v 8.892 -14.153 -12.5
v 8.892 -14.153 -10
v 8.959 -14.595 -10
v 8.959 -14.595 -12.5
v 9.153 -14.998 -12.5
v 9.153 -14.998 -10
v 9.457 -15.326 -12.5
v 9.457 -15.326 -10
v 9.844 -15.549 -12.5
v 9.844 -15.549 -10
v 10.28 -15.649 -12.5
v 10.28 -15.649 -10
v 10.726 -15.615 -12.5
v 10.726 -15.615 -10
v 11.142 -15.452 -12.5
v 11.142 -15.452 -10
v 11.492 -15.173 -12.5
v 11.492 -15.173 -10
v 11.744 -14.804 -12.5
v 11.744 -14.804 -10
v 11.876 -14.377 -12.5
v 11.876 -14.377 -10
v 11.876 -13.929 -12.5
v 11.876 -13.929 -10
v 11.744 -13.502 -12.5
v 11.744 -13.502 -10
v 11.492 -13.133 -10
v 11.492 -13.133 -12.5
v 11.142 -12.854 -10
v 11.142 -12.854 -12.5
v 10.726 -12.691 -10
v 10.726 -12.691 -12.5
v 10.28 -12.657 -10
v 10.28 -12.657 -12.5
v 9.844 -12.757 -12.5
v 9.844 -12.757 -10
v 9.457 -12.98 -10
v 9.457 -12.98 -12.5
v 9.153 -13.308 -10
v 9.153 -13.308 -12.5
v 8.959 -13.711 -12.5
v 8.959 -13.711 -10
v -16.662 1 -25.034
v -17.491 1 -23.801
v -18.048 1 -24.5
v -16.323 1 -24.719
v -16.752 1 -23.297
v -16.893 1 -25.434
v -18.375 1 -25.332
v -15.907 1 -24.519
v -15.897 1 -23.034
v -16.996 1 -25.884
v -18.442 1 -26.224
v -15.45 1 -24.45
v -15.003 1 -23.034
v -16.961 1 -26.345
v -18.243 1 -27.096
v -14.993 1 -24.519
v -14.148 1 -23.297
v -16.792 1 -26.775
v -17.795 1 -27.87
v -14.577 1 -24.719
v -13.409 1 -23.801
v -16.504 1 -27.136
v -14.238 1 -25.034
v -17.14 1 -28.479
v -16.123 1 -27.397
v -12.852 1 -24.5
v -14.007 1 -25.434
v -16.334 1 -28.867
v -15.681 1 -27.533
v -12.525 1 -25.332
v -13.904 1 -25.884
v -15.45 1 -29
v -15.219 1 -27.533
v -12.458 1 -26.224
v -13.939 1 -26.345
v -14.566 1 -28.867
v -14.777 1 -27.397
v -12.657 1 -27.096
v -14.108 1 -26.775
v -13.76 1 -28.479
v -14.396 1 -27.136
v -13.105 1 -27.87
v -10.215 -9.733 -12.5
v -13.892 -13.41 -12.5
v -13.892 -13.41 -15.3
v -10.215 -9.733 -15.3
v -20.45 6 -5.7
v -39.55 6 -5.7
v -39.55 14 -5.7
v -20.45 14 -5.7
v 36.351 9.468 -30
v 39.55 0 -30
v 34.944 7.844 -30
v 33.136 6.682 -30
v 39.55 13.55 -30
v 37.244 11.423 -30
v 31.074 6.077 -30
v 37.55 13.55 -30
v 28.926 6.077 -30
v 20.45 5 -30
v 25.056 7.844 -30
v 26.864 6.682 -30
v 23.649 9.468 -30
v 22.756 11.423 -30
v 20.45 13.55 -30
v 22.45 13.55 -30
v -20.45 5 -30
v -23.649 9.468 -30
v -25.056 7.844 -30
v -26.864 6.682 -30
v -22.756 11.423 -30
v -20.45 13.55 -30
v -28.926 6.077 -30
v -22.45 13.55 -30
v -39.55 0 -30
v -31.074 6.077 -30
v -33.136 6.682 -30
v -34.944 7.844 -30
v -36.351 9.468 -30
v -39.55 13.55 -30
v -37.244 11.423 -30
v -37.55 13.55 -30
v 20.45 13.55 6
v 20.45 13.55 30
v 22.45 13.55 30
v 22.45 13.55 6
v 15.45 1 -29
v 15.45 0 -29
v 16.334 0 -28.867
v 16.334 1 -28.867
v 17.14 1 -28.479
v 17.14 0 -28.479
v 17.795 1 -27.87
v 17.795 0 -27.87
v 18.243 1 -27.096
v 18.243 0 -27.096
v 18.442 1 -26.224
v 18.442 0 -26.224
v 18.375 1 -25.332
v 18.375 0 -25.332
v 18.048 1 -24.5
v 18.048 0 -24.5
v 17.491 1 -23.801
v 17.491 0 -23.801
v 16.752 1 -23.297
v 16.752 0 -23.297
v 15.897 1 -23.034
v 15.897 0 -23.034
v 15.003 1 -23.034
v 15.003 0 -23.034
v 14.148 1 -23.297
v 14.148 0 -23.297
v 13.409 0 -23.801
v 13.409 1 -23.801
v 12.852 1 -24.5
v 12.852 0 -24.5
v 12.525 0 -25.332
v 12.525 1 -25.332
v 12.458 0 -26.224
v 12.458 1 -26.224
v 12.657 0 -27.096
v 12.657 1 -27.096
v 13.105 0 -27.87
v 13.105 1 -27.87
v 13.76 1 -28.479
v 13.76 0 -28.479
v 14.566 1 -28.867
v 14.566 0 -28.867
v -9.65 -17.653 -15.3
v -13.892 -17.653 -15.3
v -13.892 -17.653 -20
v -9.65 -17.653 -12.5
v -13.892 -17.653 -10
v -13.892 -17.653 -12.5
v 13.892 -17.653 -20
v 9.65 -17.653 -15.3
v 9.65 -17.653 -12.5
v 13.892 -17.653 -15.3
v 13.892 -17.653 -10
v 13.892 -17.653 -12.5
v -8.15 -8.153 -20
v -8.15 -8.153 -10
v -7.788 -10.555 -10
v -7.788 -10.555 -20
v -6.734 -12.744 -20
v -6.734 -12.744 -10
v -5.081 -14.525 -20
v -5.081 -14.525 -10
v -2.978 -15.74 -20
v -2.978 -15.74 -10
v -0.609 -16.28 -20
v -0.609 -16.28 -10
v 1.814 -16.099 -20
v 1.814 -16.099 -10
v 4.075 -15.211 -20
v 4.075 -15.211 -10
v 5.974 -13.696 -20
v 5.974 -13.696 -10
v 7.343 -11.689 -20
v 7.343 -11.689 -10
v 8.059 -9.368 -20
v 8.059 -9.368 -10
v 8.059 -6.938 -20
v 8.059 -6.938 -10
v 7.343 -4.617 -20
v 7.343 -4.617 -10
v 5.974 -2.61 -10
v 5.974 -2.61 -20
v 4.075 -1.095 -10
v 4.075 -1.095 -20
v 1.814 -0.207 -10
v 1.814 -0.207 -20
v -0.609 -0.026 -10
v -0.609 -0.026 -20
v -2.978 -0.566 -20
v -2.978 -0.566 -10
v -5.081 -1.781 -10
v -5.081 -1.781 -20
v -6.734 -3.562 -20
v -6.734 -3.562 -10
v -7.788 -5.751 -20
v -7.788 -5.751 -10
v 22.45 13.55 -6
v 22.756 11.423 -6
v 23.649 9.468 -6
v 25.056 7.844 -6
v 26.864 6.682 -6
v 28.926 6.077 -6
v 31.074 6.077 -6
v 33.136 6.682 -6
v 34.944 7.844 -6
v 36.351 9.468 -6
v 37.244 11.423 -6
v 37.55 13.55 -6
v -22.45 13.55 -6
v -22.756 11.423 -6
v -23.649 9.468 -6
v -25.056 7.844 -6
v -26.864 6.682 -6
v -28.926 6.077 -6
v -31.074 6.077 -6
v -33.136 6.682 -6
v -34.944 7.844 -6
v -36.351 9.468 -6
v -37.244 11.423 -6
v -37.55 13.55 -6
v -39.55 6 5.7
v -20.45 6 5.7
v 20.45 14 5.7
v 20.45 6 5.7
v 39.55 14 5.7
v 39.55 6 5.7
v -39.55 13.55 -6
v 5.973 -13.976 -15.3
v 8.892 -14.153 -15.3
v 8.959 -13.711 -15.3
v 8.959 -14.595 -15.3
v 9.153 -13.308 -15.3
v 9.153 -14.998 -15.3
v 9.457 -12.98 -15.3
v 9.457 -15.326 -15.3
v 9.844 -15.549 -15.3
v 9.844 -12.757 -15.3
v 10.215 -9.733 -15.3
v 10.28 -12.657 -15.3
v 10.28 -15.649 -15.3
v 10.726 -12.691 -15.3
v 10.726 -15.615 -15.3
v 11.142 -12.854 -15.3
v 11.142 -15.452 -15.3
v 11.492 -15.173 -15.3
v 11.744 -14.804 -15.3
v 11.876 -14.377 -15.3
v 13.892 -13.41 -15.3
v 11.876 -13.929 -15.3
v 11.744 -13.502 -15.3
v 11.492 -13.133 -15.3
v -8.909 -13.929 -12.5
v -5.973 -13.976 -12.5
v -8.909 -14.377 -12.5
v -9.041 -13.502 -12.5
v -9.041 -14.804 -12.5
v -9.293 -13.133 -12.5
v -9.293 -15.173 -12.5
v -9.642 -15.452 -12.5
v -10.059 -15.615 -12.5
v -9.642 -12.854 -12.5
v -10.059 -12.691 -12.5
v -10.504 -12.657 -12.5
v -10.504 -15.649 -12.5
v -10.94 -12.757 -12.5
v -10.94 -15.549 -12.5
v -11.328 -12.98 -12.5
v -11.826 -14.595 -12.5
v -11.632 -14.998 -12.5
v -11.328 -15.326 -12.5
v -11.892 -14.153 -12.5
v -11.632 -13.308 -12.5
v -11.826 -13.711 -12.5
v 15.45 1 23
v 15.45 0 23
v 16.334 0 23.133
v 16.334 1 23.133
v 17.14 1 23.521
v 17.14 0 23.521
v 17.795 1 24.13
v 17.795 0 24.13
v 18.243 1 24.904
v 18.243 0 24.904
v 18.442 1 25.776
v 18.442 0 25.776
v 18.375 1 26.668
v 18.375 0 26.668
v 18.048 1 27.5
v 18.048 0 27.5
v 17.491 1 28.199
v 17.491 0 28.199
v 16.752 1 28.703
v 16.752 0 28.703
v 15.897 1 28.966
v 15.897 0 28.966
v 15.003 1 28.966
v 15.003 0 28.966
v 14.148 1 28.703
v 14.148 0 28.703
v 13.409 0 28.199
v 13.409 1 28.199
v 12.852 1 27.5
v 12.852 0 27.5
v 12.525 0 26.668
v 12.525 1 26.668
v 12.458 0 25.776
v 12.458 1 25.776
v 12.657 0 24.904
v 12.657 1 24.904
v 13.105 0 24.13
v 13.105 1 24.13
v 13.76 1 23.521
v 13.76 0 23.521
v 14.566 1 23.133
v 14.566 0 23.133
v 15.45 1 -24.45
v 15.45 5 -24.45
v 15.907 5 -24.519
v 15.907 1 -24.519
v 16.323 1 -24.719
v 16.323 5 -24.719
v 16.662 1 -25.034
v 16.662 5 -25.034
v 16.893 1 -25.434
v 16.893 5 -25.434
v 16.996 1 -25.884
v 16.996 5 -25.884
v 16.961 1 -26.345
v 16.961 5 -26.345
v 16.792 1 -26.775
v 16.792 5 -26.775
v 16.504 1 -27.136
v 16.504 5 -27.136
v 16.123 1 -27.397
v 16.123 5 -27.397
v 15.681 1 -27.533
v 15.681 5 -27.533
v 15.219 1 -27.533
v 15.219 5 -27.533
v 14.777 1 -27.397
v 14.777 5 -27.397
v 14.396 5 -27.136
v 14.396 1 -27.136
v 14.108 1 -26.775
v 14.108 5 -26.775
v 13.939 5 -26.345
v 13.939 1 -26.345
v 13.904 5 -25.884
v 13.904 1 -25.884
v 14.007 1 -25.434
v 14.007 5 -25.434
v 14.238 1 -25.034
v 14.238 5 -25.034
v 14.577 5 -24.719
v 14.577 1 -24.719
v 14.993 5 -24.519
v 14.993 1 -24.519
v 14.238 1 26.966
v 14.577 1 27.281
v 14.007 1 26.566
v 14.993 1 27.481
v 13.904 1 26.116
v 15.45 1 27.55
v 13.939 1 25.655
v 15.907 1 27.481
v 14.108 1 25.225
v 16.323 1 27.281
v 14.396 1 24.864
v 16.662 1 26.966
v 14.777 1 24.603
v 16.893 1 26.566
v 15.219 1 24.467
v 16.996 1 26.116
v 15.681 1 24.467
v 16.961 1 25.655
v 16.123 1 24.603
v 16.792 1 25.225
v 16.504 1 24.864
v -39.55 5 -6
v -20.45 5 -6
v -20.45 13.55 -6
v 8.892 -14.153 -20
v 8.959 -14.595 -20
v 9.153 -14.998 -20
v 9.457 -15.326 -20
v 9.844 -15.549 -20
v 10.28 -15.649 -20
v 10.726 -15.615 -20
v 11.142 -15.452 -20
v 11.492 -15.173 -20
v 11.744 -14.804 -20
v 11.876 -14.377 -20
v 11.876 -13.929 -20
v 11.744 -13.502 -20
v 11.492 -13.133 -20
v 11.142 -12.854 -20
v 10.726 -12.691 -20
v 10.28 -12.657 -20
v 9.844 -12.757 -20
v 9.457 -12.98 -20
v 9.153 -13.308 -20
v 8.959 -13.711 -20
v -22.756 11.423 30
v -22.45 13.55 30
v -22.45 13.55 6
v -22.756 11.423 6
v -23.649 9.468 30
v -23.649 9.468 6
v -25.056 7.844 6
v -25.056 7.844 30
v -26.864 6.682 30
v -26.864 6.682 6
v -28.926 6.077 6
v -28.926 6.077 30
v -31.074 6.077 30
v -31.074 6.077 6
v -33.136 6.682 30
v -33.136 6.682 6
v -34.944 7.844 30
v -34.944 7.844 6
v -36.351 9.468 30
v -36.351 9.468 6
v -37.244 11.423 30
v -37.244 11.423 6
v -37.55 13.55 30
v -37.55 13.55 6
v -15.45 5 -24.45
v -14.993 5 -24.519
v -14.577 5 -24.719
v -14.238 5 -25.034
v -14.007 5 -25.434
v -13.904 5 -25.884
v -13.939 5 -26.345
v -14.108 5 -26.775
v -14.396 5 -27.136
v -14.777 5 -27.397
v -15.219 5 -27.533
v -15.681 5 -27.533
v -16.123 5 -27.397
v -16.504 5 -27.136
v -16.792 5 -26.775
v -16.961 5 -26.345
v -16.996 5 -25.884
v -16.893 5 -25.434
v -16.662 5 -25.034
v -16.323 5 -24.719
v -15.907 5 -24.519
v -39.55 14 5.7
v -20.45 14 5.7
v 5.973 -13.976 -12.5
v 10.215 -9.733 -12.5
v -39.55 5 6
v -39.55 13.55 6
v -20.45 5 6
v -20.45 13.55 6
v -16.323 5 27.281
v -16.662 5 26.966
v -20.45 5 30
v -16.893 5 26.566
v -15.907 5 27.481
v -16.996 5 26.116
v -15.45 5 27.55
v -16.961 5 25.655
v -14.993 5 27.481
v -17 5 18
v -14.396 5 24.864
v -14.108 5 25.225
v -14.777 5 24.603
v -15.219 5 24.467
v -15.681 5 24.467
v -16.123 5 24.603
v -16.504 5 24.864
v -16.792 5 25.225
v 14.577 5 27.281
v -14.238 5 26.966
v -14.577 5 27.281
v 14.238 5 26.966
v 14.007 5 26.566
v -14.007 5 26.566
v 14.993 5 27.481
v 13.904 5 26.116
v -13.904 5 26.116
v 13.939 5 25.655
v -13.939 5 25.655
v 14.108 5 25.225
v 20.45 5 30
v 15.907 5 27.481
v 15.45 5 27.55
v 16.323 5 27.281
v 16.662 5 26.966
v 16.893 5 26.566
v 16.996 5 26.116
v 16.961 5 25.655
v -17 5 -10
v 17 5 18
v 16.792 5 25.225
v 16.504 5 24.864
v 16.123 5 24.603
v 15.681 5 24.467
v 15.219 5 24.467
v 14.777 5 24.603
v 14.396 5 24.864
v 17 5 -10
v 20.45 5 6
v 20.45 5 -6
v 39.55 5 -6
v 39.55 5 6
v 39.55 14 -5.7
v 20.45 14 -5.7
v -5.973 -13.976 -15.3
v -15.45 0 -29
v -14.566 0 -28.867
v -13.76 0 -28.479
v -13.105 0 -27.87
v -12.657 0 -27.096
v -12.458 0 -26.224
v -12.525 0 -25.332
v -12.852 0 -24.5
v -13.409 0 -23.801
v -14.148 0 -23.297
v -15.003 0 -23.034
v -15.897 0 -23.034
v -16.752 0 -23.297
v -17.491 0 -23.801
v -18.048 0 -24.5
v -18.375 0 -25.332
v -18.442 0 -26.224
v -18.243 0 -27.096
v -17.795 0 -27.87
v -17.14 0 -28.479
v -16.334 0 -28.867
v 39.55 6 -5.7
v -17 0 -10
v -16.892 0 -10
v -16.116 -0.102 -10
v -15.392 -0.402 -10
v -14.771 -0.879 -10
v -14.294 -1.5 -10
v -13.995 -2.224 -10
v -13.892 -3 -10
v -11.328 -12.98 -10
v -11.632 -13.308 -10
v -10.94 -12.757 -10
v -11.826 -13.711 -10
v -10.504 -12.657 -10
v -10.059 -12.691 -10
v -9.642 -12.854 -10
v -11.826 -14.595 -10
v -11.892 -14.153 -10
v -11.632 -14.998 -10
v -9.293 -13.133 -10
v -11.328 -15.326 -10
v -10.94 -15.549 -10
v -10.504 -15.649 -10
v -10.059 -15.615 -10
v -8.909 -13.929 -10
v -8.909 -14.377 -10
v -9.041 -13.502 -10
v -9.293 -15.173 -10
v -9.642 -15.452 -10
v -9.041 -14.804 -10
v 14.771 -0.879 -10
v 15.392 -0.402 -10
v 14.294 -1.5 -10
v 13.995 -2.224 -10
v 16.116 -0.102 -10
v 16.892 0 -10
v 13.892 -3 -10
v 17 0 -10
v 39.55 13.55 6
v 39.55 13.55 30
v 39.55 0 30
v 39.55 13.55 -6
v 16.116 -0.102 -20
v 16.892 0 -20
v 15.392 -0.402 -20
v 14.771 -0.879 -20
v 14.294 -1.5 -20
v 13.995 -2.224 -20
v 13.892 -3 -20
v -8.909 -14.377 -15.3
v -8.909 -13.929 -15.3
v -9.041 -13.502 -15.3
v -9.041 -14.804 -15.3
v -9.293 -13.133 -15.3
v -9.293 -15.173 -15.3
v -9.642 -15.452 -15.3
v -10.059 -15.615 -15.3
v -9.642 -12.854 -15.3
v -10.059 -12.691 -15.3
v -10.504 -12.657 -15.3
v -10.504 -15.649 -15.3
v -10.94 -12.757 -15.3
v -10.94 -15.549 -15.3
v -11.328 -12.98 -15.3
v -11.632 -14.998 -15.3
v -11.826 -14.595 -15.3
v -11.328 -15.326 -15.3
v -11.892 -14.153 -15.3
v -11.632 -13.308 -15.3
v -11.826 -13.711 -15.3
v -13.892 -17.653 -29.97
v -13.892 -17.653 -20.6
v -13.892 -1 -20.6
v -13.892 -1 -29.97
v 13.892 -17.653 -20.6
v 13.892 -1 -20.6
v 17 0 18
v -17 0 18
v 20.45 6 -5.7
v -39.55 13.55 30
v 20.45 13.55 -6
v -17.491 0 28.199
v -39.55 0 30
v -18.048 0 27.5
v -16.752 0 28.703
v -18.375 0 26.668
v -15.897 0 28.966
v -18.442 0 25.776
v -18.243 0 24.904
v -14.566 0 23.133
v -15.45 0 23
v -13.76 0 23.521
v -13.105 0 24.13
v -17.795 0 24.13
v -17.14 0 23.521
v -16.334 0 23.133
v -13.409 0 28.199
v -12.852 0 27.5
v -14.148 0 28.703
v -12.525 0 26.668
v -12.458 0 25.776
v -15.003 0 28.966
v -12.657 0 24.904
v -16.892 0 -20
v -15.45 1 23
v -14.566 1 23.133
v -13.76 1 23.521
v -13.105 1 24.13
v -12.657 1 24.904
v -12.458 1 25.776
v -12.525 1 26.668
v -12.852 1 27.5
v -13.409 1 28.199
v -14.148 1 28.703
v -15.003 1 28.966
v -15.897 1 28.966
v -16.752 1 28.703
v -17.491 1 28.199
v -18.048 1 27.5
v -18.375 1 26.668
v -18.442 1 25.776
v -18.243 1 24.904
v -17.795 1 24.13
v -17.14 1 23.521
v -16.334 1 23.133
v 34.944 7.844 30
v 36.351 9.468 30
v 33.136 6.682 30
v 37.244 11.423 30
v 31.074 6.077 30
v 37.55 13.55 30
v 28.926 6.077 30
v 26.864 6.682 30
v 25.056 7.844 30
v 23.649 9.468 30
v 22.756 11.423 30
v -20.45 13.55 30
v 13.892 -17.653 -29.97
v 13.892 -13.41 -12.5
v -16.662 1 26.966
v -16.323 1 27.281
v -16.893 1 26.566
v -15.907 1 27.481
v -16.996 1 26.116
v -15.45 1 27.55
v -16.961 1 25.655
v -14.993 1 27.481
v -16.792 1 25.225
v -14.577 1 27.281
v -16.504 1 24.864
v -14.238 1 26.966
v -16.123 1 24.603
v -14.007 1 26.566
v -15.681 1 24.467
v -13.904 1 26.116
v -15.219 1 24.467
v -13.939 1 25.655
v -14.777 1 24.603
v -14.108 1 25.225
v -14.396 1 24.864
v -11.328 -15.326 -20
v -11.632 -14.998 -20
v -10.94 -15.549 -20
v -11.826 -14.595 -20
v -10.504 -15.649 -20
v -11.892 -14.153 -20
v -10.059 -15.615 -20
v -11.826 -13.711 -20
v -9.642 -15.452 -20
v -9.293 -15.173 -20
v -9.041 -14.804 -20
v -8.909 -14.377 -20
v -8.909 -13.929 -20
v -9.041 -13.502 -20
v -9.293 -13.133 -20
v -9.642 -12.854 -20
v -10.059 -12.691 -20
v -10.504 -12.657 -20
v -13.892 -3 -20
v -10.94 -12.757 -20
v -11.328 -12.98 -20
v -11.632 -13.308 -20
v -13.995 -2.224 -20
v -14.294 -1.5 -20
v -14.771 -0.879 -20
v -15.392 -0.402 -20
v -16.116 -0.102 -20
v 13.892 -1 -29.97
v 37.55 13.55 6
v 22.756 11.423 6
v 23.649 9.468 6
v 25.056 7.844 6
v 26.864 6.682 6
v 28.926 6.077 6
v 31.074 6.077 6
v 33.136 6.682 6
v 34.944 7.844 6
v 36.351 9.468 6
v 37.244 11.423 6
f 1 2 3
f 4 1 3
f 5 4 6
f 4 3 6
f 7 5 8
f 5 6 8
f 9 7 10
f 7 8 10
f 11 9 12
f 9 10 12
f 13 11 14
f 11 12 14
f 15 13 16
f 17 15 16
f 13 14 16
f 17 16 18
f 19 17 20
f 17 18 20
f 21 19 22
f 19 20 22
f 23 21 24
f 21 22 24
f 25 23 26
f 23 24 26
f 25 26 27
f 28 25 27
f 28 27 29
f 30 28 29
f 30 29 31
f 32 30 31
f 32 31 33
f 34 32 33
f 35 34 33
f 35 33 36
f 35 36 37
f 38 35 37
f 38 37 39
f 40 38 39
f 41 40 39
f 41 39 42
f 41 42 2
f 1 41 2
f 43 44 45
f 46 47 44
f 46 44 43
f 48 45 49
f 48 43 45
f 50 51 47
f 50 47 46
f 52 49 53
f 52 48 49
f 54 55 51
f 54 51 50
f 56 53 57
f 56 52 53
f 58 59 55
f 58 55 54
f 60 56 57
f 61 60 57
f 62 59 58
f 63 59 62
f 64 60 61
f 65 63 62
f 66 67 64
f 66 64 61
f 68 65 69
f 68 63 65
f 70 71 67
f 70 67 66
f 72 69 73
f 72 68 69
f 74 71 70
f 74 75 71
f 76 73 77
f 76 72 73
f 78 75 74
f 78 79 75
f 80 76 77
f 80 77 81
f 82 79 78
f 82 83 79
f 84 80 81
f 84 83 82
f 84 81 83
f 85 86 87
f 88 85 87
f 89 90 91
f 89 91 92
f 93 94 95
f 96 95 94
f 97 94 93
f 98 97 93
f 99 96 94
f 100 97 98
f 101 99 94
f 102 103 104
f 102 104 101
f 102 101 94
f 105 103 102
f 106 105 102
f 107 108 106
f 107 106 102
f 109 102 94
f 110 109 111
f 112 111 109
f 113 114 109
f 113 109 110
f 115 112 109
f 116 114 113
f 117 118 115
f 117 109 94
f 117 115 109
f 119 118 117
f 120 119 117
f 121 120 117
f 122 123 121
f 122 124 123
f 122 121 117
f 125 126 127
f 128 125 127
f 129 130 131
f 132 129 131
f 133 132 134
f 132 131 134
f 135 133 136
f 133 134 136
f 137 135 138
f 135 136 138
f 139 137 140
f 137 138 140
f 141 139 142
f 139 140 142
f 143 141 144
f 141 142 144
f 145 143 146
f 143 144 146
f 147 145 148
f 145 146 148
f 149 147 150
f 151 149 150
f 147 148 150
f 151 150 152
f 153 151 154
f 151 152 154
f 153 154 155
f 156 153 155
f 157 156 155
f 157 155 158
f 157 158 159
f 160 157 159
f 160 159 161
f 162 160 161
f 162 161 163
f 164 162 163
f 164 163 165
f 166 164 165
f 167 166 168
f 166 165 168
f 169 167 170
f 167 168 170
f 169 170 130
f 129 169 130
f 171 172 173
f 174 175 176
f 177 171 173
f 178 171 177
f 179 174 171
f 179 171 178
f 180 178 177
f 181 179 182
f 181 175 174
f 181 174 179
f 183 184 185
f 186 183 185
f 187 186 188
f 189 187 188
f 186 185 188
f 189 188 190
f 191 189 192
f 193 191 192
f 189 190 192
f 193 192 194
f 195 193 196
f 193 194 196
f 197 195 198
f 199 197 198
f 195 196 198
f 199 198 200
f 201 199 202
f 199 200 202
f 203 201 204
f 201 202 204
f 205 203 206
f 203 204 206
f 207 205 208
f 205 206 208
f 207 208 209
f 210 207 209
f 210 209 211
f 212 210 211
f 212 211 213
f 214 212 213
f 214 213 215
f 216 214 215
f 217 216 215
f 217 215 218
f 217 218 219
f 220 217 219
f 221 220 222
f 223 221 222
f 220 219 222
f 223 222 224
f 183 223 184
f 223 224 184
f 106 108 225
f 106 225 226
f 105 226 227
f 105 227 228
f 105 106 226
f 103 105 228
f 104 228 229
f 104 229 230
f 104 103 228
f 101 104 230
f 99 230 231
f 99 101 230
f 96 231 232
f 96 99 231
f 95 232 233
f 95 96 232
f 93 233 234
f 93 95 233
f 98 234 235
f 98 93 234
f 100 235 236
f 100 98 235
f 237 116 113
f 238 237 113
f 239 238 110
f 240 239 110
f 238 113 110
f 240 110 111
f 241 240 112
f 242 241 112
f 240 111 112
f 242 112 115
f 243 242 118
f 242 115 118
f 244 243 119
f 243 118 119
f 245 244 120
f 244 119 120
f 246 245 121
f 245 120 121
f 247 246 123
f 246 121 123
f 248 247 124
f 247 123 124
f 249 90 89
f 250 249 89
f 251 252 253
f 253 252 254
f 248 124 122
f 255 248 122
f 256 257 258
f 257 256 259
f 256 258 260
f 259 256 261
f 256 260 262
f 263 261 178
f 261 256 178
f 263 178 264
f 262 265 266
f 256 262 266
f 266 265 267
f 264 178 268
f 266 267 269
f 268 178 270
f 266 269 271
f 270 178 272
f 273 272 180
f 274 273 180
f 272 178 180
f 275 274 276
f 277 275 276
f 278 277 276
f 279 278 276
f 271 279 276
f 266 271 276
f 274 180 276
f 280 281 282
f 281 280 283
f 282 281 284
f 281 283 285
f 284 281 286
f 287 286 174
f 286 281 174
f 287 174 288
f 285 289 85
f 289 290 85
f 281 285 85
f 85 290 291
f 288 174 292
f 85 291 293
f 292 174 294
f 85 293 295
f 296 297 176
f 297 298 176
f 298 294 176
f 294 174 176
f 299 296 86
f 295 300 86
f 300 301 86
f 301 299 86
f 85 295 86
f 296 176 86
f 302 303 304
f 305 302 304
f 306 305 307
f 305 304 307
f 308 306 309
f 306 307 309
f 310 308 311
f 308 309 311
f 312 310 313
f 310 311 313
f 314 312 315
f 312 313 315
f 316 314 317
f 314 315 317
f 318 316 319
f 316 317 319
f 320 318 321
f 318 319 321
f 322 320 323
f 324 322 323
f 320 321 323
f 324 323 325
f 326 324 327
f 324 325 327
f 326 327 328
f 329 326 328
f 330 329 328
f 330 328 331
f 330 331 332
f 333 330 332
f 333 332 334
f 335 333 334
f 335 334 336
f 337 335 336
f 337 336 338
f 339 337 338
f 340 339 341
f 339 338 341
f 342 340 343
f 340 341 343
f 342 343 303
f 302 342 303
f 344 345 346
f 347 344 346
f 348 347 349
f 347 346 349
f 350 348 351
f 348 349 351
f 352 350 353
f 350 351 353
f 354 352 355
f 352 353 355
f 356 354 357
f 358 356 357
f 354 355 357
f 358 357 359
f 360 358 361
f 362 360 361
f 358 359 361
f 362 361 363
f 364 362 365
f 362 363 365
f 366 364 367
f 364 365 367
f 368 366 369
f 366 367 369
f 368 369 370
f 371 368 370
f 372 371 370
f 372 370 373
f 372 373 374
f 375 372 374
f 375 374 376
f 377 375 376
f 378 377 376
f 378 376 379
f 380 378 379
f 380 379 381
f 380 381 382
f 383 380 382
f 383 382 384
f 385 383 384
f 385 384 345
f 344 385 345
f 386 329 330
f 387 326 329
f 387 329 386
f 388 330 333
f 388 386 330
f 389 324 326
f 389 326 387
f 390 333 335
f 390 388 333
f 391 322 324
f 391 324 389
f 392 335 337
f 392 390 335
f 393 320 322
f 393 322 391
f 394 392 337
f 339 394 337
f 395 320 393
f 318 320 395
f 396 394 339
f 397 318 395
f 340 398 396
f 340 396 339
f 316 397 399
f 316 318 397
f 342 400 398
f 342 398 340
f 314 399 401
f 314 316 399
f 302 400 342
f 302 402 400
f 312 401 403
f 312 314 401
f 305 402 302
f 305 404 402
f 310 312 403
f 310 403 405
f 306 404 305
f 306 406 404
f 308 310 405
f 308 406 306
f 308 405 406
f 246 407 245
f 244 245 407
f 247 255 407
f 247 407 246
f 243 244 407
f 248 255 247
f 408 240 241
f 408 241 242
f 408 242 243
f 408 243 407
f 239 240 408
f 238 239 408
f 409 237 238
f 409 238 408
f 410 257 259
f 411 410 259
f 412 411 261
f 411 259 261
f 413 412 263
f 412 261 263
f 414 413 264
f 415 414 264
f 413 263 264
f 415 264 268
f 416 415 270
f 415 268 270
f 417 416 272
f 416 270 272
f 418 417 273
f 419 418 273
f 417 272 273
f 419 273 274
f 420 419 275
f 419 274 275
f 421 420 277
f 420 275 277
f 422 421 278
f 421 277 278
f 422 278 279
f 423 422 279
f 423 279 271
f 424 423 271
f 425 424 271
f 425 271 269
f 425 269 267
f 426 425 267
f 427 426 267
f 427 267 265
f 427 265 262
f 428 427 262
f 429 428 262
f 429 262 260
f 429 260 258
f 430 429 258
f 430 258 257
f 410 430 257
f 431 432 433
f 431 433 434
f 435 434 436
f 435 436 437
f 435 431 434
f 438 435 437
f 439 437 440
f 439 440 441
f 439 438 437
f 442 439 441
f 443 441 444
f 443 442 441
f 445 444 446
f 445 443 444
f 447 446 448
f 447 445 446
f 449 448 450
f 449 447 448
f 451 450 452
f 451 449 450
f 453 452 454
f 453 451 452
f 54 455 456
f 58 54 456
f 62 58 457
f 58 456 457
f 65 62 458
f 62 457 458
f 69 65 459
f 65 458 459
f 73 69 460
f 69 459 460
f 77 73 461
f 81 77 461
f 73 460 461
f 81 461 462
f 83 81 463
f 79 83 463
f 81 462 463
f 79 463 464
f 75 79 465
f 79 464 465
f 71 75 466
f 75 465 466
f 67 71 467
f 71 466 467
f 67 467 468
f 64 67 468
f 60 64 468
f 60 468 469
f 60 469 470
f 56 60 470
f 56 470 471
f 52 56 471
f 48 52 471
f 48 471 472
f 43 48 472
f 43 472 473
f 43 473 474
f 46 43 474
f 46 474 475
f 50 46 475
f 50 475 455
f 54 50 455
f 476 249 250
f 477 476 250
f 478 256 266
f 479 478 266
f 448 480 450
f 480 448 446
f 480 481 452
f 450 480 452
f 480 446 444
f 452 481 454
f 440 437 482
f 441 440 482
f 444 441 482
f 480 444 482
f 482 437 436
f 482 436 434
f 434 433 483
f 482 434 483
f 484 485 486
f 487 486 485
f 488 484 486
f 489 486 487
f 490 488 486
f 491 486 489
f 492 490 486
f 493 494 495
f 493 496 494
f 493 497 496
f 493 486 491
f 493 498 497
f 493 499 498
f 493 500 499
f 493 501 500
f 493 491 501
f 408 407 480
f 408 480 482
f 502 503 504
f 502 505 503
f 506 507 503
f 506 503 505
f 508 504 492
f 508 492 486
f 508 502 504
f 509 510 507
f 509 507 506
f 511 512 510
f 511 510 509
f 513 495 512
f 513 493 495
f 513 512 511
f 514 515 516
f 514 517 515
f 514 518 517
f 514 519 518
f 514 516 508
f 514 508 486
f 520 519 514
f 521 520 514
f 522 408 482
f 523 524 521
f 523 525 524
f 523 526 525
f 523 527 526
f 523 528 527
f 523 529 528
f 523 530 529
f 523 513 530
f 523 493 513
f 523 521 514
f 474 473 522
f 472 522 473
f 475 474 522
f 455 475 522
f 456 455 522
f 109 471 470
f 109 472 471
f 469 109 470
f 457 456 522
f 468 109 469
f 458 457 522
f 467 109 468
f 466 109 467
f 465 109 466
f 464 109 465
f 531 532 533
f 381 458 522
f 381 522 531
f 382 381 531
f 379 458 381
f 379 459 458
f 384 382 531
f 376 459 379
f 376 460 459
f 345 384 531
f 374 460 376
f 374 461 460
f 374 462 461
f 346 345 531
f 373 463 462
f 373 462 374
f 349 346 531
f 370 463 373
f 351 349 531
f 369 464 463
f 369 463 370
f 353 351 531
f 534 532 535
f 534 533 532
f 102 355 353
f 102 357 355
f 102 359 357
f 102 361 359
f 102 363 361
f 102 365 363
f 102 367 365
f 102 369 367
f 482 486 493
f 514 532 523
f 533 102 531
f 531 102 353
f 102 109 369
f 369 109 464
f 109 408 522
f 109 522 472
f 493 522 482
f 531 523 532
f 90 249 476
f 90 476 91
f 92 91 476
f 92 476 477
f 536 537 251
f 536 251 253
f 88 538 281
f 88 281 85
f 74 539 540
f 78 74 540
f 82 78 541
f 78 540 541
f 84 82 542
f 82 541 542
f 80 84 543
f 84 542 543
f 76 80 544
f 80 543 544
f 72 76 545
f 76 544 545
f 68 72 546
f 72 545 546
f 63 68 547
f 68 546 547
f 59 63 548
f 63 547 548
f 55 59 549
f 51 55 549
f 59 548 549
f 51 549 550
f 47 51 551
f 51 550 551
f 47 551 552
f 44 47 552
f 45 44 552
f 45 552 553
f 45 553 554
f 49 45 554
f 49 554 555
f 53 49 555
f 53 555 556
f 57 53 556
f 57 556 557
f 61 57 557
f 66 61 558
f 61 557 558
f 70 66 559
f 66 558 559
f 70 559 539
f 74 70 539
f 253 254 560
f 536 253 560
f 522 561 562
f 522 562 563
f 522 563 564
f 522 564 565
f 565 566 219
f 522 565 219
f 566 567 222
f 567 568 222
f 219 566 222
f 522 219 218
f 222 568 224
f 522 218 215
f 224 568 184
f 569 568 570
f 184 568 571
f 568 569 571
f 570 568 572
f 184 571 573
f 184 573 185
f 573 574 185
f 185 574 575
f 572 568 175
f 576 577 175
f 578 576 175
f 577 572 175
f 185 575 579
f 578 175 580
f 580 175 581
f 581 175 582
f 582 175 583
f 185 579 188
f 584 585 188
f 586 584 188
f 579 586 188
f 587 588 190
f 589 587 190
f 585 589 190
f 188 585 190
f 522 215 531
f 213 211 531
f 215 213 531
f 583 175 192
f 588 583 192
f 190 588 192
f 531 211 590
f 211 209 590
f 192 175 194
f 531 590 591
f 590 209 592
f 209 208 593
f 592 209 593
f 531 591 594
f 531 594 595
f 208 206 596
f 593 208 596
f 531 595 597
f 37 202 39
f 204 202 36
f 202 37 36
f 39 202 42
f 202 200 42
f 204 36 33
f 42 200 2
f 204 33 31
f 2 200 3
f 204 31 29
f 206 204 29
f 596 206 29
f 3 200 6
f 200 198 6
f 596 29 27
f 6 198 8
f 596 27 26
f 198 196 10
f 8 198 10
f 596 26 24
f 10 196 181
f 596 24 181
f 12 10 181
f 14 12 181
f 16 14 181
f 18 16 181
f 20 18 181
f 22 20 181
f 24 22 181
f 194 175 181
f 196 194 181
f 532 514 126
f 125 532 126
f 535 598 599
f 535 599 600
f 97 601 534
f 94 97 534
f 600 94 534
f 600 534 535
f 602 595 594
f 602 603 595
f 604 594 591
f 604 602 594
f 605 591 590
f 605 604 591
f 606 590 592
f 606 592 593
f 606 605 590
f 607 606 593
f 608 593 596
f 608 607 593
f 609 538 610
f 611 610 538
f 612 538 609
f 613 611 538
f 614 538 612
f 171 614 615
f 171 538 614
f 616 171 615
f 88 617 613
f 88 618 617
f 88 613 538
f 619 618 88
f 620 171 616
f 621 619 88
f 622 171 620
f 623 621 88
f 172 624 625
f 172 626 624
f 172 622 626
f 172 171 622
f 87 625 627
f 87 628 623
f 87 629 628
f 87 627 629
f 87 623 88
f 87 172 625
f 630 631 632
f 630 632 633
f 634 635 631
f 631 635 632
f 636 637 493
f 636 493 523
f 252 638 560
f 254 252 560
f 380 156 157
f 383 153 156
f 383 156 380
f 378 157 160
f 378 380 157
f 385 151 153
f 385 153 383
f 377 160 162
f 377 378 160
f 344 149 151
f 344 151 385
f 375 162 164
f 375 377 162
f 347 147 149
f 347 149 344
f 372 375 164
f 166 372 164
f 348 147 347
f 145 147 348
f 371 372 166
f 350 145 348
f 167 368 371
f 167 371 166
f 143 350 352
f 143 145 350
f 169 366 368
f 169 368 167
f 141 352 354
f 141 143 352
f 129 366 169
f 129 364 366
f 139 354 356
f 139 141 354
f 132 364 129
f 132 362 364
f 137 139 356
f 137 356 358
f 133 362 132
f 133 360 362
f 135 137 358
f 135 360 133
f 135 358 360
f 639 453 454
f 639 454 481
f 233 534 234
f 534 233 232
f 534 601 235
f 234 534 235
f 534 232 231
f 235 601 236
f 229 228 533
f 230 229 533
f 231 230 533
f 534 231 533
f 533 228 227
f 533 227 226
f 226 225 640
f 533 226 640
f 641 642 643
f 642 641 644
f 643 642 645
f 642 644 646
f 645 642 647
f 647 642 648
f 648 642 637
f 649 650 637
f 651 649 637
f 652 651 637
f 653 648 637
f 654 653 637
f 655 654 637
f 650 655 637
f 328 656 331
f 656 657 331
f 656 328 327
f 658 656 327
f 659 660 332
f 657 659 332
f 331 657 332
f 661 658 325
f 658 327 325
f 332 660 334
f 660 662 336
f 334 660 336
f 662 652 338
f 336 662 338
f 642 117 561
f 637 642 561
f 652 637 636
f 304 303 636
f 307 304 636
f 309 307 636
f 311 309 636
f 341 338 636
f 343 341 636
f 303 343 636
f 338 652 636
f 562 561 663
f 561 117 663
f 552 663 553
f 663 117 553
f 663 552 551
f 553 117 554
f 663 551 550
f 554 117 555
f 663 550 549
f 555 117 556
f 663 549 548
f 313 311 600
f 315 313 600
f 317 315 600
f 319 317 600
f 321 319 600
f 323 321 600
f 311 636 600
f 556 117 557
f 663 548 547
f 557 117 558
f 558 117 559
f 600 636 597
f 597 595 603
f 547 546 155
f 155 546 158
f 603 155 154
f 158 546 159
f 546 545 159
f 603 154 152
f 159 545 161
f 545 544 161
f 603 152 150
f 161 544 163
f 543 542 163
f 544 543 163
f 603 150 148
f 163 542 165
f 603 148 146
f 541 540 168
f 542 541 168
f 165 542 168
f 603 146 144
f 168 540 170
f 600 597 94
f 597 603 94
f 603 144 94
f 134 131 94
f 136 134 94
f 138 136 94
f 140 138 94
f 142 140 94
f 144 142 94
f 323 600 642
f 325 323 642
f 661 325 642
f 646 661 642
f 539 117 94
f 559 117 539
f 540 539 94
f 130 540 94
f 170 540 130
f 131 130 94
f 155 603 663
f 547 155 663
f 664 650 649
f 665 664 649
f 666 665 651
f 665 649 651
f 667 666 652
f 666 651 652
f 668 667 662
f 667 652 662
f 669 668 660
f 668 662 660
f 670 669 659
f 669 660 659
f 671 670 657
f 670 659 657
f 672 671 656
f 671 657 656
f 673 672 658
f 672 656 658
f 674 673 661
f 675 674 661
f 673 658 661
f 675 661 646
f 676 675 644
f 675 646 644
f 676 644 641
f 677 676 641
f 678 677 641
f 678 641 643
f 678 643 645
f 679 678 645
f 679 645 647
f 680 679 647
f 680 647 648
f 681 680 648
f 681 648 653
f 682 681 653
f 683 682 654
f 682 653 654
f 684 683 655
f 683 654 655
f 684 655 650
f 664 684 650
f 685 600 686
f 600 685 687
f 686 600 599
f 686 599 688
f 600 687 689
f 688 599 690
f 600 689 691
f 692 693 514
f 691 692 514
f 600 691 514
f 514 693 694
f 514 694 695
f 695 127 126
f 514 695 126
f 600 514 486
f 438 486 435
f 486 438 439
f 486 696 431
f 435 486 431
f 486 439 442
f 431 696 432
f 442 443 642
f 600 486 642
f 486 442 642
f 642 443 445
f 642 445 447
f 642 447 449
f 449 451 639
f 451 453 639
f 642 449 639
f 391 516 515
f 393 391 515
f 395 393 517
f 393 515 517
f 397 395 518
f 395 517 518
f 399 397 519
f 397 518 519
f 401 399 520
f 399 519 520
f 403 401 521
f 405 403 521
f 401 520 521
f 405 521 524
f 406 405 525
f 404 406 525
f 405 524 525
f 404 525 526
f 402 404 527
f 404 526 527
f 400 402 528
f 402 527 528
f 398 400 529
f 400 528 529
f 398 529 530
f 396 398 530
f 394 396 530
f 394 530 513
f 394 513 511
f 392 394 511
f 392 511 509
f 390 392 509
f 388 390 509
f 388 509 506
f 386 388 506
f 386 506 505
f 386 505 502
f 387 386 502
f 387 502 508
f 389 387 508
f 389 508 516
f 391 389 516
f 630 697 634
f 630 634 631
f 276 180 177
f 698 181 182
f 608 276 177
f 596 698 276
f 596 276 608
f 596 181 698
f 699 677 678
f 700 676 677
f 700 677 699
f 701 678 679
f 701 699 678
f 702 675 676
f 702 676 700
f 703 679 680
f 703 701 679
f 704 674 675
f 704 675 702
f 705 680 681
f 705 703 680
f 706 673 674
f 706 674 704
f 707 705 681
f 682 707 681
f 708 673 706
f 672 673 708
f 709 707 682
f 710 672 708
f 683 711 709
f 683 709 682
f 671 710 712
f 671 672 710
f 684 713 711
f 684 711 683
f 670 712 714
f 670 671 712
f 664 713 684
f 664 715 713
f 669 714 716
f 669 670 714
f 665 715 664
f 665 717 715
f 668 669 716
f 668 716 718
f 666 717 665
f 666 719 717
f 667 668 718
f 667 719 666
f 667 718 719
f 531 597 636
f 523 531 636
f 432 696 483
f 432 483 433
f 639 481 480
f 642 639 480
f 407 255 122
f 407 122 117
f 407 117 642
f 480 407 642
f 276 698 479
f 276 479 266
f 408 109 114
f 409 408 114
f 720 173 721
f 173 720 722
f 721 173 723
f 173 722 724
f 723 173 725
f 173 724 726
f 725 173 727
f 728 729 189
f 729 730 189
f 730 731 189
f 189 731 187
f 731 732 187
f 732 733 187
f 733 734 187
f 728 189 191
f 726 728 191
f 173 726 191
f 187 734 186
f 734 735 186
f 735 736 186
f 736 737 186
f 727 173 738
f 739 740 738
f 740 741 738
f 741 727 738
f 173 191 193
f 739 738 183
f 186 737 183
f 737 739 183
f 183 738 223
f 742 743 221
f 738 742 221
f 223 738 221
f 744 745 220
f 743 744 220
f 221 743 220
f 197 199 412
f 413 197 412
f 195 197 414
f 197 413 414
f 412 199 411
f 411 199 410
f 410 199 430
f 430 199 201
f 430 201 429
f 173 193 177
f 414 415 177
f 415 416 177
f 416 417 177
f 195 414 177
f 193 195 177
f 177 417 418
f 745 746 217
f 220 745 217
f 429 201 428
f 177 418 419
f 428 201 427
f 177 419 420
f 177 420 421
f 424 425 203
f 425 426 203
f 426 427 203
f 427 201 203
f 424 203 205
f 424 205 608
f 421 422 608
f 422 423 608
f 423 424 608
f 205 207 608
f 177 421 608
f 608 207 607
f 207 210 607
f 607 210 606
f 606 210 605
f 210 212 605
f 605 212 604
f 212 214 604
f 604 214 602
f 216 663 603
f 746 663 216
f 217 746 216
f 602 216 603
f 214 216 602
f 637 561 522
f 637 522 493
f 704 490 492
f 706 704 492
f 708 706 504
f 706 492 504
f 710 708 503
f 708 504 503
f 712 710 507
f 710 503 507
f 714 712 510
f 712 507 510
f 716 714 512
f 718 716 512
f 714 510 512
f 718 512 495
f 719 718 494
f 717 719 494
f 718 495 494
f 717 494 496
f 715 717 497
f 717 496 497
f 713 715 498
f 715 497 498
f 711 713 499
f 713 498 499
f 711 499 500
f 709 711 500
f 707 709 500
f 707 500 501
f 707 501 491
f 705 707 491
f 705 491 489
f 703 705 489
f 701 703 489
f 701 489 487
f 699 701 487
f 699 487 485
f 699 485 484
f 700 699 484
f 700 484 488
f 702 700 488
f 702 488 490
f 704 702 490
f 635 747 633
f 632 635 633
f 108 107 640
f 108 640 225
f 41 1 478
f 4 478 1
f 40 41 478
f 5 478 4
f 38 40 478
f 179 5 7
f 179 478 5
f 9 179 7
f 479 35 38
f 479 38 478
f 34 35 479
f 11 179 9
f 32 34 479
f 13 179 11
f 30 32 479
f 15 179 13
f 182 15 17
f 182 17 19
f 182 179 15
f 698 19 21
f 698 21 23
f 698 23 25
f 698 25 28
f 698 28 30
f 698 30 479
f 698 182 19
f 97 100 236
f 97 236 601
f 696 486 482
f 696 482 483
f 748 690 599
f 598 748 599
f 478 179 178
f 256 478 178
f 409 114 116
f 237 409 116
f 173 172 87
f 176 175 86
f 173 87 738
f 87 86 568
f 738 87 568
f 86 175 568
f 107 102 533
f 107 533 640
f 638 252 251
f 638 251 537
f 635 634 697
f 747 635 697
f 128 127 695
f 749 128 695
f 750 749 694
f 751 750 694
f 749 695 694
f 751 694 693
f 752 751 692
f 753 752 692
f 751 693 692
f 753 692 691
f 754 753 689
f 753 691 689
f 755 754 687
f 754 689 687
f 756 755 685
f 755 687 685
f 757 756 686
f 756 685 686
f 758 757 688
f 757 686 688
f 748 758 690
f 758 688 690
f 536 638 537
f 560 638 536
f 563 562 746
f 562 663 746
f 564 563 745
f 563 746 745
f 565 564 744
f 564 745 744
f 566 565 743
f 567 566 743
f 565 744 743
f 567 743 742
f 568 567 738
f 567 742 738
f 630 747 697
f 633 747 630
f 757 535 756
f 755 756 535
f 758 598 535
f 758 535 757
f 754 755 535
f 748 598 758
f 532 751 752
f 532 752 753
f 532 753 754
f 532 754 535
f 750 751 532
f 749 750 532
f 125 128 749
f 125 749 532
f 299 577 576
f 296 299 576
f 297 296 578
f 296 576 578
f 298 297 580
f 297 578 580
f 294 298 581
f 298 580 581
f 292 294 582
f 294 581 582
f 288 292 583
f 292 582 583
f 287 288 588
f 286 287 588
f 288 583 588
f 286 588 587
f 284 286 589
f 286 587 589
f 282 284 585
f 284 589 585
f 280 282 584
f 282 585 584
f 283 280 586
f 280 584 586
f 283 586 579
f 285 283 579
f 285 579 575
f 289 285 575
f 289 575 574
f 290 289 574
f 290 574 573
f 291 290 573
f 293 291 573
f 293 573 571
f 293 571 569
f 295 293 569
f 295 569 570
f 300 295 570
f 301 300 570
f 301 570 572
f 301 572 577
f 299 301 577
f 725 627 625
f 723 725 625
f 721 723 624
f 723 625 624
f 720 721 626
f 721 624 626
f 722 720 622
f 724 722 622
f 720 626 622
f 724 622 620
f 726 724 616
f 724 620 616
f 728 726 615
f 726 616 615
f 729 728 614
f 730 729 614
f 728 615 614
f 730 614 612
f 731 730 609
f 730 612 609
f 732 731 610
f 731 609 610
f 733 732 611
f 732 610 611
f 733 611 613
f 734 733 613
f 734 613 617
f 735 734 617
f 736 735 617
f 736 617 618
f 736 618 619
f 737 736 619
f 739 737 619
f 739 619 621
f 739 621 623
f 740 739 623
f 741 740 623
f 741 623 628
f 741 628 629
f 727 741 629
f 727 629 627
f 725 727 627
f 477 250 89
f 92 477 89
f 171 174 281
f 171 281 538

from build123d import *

# Parameters (mm, degrees)
SKETCH1_W             = 79.1
SKETCH1_H             = 60
BOSS_EXTRUDE1_DEPTH   = 5
BOSS_EXTRUDE2_DEPTH   = 24
MIRROR2_COPY_1_DEPTH  = 24
SKETCH10_R            = 1.55
CUT_EXTRUDE7_DEPTH    = 8
SKETCH11_R            = 3
CUT_EXTRUDE8_DEPTH    = 1
SKETCH12_W            = 27.78460969
SKETCH12_H            = 17.653
SKETCH12_R            = 1.5
SKETCH12_R_2          = 8.15
BOSS_EXTRUDE5_DEPTH   = 10
SKETCH13_W            = 34
SKETCH13_H            = 28
CUT_EXTRUDE9_DEPTH    = 10
FILLET2_R             = 3
SKETCH15_W            = 6
SKETCH15_H            = 2.8
CUT_EXTRUDE12_DEPTH   = 8.2
SKETCH17_W            = 19.1
SKETCH17_H            = 11.4
BOSS_EXTRUDE6_DEPTH   = 8
BOSS_EXTRUDE6_2_DEPTH = 8
SKETCH18_W            = 27.78460969
SKETCH18_H            = 9.370460502
BOSS_EXTRUDE7_DEPTH   = 16.653


with BuildPart() as part:
    # Sketch1 → Boss-Extrude1 (new body)
    with BuildSketch(Plane(origin=(0, 0, 0), x_dir=(1, 0, 0), z_dir=(0, 1, 0))):
        Rectangle(SKETCH1_W, SKETCH1_H)
    extrude(amount=BOSS_EXTRUDE1_DEPTH)

    # Sketch2 → Boss-Extrude2 (add)
    with BuildSketch(Plane.XY.offset(30)):
        with BuildLine():
            Line((-39.55, 13.55), (-39.55, 5))
            Line((-39.55, 5), (-20.45, 5))
            Line((-20.45, 5), (-20.45, 13.55))
            Line((-20.45, 13.55), (-22.45, 13.55))
            ThreePointArc((-22.45, 13.55), (-30, 6), (-37.55, 13.55))
            Line((-37.55, 13.55), (-39.55, 13.55))
        make_face()
    boss_extrude2 = extrude(amount=-BOSS_EXTRUDE2_DEPTH)

    # Mirror1: Boss-Extrude2 across plane
    add(boss_extrude2.mirror(Plane.XY))

    # Mirror2: Boss-Extrude2 across plane
    add(boss_extrude2.mirror(Plane(origin=(0, 0, 0), x_dir=(0, 0, 1), z_dir=(1, 0, 0))))

    # Mirror2 copy 1 sketch → Mirror2 copy 1 (add)
    with BuildSketch(Plane(origin=(0, 0, -30), x_dir=(-1, 0, 0), z_dir=(0, 0, -1))):
        with BuildLine():
            Line((-39.55, 13.55), (-39.55, 5))
            Line((-39.55, 5), (-20.45, 5))
            Line((-20.45, 5), (-20.45, 13.55))
            Line((-20.45, 13.55), (-22.45, 13.55))
            ThreePointArc((-22.45, 13.55), (-30, 6), (-37.55, 13.55))
            Line((-37.55, 13.55), (-39.55, 13.55))
        make_face()
    extrude(amount=-MIRROR2_COPY_1_DEPTH)

    # Sketch10 → Cut-Extrude7 (cut)
    with BuildSketch(Plane(origin=(0, 5, 0), x_dir=(1, 0, 0), z_dir=(0, 1, 0))):
        with Locations(Location((-15.45, -26, 0), (0, 0, 270))):
            Circle(SKETCH10_R)
        with Locations(Location((-15.45, 26, 0), (0, 0, 270))):
            Circle(SKETCH10_R)
        with Locations(Location((15.45, 26, 0), (0, 0, 270))):
            Circle(SKETCH10_R)
        with Locations(Location((15.45, -26, 0), (0, 0, 270))):
            Circle(SKETCH10_R)
    extrude(amount=-CUT_EXTRUDE7_DEPTH, mode=Mode.SUBTRACT)

    # Sketch11 → Cut-Extrude8 (cut)
    with BuildSketch(Plane.XZ):
        with Locations(Location((-15.45, 26, 0), (0, 0, 270))):
            Circle(SKETCH11_R)
        with Locations(Location((15.45, 26, 0), (0, 0, 270))):
            Circle(SKETCH11_R)
        with Locations(Location((15.45, -26, 0), (0, 0, 270))):
            Circle(SKETCH11_R)
        with Locations(Location((-15.45, -26, 0), (0, 0, 270))):
            Circle(SKETCH11_R)
    extrude(amount=-CUT_EXTRUDE8_DEPTH, mode=Mode.SUBTRACT)

    # Sketch12 → Boss-Extrude5 (add)
    with BuildSketch(Plane.XY.offset(-10)):
        with Locations((0, -8.8265)):
            Rectangle(SKETCH12_W, SKETCH12_H)
        with Locations(Location((-10.392304845, -14.153, 0), (0, 0, 180))):
            Circle(SKETCH12_R, mode=Mode.SUBTRACT)
        with Locations(Location((10.392304845, -14.153, 0), (0, 0, 180))):
            Circle(SKETCH12_R, mode=Mode.SUBTRACT)
        with Locations(Location((0, -8.153, 0), (0, 0, 180))):
            Circle(SKETCH12_R_2, mode=Mode.SUBTRACT)
    extrude(amount=-BOSS_EXTRUDE5_DEPTH)

    # Sketch13 → Cut-Extrude9 (cut)
    with BuildSketch(Plane.XZ):
        with Locations((0, 4)):
            Rectangle(SKETCH13_W, SKETCH13_H)
    extrude(amount=-CUT_EXTRUDE9_DEPTH, mode=Mode.SUBTRACT)

    # Fillet2
    fillet2_edges = [part.edges().sort_by_distance(p)[0] for p in [
        (-13.892304845, 0, -15),
        (13.892304845, 0, -15),
    ]]
    fillet(fillet2_edges, radius=FILLET2_R)

    # Sketch15 → Cut-Extrude12 (cut)
    with BuildSketch(Plane(origin=(-15.772652423, -15.772652423, 0), x_dir=(-0.7071067811865477, 0.7071067811865475, 0), z_dir=(-0.7071067811865475, -0.7071067811865477, 0))):
        with Locations((-2.659213046, 13.9)):
            Rectangle(SKETCH15_W, SKETCH15_H)
    cut_extrude12 = extrude(amount=-CUT_EXTRUDE12_DEPTH, mode=Mode.SUBTRACT)

    # Mirror3: Cut-Extrude12 across plane
    add(cut_extrude12.mirror(Plane(origin=(0, 0, 0), x_dir=(0, 0, 1), z_dir=(1, 0, 0))), mode=Mode.SUBTRACT)


with BuildPart() as body_2:
    # Sketch17 → Boss-Extrude6 (new body)
    with BuildSketch(Plane(origin=(0, 6, 0), x_dir=(1, 0, 0), z_dir=(0, 1, 0))):
        with Locations((-30, 0)):
            Rectangle(SKETCH17_W, SKETCH17_H)
    extrude(amount=BOSS_EXTRUDE6_DEPTH)


with BuildPart() as body_3:
    # Sketch17 → Boss-Extrude6 2 (new body)
    with BuildSketch(Plane(origin=(0, 6, 0), x_dir=(1, 0, 0), z_dir=(0, 1, 0))):
        with Locations((30, 0)):
            Rectangle(SKETCH17_W, SKETCH17_H)
    extrude(amount=BOSS_EXTRUDE6_2_DEPTH)


with BuildPart() as body_4:
    # Sketch18 → Boss-Extrude7 (new body)
    with BuildSketch(Plane(origin=(0, -1, 0), x_dir=(-1, 0, 0), z_dir=(0, -1, 0))):
        with Locations((0, 25.285230251)):
            Rectangle(SKETCH18_W, SKETCH18_H)
    extrude(amount=BOSS_EXTRUDE7_DEPTH)


solid = Compound([part.part, body_2.part, body_3.part, body_4.part])
